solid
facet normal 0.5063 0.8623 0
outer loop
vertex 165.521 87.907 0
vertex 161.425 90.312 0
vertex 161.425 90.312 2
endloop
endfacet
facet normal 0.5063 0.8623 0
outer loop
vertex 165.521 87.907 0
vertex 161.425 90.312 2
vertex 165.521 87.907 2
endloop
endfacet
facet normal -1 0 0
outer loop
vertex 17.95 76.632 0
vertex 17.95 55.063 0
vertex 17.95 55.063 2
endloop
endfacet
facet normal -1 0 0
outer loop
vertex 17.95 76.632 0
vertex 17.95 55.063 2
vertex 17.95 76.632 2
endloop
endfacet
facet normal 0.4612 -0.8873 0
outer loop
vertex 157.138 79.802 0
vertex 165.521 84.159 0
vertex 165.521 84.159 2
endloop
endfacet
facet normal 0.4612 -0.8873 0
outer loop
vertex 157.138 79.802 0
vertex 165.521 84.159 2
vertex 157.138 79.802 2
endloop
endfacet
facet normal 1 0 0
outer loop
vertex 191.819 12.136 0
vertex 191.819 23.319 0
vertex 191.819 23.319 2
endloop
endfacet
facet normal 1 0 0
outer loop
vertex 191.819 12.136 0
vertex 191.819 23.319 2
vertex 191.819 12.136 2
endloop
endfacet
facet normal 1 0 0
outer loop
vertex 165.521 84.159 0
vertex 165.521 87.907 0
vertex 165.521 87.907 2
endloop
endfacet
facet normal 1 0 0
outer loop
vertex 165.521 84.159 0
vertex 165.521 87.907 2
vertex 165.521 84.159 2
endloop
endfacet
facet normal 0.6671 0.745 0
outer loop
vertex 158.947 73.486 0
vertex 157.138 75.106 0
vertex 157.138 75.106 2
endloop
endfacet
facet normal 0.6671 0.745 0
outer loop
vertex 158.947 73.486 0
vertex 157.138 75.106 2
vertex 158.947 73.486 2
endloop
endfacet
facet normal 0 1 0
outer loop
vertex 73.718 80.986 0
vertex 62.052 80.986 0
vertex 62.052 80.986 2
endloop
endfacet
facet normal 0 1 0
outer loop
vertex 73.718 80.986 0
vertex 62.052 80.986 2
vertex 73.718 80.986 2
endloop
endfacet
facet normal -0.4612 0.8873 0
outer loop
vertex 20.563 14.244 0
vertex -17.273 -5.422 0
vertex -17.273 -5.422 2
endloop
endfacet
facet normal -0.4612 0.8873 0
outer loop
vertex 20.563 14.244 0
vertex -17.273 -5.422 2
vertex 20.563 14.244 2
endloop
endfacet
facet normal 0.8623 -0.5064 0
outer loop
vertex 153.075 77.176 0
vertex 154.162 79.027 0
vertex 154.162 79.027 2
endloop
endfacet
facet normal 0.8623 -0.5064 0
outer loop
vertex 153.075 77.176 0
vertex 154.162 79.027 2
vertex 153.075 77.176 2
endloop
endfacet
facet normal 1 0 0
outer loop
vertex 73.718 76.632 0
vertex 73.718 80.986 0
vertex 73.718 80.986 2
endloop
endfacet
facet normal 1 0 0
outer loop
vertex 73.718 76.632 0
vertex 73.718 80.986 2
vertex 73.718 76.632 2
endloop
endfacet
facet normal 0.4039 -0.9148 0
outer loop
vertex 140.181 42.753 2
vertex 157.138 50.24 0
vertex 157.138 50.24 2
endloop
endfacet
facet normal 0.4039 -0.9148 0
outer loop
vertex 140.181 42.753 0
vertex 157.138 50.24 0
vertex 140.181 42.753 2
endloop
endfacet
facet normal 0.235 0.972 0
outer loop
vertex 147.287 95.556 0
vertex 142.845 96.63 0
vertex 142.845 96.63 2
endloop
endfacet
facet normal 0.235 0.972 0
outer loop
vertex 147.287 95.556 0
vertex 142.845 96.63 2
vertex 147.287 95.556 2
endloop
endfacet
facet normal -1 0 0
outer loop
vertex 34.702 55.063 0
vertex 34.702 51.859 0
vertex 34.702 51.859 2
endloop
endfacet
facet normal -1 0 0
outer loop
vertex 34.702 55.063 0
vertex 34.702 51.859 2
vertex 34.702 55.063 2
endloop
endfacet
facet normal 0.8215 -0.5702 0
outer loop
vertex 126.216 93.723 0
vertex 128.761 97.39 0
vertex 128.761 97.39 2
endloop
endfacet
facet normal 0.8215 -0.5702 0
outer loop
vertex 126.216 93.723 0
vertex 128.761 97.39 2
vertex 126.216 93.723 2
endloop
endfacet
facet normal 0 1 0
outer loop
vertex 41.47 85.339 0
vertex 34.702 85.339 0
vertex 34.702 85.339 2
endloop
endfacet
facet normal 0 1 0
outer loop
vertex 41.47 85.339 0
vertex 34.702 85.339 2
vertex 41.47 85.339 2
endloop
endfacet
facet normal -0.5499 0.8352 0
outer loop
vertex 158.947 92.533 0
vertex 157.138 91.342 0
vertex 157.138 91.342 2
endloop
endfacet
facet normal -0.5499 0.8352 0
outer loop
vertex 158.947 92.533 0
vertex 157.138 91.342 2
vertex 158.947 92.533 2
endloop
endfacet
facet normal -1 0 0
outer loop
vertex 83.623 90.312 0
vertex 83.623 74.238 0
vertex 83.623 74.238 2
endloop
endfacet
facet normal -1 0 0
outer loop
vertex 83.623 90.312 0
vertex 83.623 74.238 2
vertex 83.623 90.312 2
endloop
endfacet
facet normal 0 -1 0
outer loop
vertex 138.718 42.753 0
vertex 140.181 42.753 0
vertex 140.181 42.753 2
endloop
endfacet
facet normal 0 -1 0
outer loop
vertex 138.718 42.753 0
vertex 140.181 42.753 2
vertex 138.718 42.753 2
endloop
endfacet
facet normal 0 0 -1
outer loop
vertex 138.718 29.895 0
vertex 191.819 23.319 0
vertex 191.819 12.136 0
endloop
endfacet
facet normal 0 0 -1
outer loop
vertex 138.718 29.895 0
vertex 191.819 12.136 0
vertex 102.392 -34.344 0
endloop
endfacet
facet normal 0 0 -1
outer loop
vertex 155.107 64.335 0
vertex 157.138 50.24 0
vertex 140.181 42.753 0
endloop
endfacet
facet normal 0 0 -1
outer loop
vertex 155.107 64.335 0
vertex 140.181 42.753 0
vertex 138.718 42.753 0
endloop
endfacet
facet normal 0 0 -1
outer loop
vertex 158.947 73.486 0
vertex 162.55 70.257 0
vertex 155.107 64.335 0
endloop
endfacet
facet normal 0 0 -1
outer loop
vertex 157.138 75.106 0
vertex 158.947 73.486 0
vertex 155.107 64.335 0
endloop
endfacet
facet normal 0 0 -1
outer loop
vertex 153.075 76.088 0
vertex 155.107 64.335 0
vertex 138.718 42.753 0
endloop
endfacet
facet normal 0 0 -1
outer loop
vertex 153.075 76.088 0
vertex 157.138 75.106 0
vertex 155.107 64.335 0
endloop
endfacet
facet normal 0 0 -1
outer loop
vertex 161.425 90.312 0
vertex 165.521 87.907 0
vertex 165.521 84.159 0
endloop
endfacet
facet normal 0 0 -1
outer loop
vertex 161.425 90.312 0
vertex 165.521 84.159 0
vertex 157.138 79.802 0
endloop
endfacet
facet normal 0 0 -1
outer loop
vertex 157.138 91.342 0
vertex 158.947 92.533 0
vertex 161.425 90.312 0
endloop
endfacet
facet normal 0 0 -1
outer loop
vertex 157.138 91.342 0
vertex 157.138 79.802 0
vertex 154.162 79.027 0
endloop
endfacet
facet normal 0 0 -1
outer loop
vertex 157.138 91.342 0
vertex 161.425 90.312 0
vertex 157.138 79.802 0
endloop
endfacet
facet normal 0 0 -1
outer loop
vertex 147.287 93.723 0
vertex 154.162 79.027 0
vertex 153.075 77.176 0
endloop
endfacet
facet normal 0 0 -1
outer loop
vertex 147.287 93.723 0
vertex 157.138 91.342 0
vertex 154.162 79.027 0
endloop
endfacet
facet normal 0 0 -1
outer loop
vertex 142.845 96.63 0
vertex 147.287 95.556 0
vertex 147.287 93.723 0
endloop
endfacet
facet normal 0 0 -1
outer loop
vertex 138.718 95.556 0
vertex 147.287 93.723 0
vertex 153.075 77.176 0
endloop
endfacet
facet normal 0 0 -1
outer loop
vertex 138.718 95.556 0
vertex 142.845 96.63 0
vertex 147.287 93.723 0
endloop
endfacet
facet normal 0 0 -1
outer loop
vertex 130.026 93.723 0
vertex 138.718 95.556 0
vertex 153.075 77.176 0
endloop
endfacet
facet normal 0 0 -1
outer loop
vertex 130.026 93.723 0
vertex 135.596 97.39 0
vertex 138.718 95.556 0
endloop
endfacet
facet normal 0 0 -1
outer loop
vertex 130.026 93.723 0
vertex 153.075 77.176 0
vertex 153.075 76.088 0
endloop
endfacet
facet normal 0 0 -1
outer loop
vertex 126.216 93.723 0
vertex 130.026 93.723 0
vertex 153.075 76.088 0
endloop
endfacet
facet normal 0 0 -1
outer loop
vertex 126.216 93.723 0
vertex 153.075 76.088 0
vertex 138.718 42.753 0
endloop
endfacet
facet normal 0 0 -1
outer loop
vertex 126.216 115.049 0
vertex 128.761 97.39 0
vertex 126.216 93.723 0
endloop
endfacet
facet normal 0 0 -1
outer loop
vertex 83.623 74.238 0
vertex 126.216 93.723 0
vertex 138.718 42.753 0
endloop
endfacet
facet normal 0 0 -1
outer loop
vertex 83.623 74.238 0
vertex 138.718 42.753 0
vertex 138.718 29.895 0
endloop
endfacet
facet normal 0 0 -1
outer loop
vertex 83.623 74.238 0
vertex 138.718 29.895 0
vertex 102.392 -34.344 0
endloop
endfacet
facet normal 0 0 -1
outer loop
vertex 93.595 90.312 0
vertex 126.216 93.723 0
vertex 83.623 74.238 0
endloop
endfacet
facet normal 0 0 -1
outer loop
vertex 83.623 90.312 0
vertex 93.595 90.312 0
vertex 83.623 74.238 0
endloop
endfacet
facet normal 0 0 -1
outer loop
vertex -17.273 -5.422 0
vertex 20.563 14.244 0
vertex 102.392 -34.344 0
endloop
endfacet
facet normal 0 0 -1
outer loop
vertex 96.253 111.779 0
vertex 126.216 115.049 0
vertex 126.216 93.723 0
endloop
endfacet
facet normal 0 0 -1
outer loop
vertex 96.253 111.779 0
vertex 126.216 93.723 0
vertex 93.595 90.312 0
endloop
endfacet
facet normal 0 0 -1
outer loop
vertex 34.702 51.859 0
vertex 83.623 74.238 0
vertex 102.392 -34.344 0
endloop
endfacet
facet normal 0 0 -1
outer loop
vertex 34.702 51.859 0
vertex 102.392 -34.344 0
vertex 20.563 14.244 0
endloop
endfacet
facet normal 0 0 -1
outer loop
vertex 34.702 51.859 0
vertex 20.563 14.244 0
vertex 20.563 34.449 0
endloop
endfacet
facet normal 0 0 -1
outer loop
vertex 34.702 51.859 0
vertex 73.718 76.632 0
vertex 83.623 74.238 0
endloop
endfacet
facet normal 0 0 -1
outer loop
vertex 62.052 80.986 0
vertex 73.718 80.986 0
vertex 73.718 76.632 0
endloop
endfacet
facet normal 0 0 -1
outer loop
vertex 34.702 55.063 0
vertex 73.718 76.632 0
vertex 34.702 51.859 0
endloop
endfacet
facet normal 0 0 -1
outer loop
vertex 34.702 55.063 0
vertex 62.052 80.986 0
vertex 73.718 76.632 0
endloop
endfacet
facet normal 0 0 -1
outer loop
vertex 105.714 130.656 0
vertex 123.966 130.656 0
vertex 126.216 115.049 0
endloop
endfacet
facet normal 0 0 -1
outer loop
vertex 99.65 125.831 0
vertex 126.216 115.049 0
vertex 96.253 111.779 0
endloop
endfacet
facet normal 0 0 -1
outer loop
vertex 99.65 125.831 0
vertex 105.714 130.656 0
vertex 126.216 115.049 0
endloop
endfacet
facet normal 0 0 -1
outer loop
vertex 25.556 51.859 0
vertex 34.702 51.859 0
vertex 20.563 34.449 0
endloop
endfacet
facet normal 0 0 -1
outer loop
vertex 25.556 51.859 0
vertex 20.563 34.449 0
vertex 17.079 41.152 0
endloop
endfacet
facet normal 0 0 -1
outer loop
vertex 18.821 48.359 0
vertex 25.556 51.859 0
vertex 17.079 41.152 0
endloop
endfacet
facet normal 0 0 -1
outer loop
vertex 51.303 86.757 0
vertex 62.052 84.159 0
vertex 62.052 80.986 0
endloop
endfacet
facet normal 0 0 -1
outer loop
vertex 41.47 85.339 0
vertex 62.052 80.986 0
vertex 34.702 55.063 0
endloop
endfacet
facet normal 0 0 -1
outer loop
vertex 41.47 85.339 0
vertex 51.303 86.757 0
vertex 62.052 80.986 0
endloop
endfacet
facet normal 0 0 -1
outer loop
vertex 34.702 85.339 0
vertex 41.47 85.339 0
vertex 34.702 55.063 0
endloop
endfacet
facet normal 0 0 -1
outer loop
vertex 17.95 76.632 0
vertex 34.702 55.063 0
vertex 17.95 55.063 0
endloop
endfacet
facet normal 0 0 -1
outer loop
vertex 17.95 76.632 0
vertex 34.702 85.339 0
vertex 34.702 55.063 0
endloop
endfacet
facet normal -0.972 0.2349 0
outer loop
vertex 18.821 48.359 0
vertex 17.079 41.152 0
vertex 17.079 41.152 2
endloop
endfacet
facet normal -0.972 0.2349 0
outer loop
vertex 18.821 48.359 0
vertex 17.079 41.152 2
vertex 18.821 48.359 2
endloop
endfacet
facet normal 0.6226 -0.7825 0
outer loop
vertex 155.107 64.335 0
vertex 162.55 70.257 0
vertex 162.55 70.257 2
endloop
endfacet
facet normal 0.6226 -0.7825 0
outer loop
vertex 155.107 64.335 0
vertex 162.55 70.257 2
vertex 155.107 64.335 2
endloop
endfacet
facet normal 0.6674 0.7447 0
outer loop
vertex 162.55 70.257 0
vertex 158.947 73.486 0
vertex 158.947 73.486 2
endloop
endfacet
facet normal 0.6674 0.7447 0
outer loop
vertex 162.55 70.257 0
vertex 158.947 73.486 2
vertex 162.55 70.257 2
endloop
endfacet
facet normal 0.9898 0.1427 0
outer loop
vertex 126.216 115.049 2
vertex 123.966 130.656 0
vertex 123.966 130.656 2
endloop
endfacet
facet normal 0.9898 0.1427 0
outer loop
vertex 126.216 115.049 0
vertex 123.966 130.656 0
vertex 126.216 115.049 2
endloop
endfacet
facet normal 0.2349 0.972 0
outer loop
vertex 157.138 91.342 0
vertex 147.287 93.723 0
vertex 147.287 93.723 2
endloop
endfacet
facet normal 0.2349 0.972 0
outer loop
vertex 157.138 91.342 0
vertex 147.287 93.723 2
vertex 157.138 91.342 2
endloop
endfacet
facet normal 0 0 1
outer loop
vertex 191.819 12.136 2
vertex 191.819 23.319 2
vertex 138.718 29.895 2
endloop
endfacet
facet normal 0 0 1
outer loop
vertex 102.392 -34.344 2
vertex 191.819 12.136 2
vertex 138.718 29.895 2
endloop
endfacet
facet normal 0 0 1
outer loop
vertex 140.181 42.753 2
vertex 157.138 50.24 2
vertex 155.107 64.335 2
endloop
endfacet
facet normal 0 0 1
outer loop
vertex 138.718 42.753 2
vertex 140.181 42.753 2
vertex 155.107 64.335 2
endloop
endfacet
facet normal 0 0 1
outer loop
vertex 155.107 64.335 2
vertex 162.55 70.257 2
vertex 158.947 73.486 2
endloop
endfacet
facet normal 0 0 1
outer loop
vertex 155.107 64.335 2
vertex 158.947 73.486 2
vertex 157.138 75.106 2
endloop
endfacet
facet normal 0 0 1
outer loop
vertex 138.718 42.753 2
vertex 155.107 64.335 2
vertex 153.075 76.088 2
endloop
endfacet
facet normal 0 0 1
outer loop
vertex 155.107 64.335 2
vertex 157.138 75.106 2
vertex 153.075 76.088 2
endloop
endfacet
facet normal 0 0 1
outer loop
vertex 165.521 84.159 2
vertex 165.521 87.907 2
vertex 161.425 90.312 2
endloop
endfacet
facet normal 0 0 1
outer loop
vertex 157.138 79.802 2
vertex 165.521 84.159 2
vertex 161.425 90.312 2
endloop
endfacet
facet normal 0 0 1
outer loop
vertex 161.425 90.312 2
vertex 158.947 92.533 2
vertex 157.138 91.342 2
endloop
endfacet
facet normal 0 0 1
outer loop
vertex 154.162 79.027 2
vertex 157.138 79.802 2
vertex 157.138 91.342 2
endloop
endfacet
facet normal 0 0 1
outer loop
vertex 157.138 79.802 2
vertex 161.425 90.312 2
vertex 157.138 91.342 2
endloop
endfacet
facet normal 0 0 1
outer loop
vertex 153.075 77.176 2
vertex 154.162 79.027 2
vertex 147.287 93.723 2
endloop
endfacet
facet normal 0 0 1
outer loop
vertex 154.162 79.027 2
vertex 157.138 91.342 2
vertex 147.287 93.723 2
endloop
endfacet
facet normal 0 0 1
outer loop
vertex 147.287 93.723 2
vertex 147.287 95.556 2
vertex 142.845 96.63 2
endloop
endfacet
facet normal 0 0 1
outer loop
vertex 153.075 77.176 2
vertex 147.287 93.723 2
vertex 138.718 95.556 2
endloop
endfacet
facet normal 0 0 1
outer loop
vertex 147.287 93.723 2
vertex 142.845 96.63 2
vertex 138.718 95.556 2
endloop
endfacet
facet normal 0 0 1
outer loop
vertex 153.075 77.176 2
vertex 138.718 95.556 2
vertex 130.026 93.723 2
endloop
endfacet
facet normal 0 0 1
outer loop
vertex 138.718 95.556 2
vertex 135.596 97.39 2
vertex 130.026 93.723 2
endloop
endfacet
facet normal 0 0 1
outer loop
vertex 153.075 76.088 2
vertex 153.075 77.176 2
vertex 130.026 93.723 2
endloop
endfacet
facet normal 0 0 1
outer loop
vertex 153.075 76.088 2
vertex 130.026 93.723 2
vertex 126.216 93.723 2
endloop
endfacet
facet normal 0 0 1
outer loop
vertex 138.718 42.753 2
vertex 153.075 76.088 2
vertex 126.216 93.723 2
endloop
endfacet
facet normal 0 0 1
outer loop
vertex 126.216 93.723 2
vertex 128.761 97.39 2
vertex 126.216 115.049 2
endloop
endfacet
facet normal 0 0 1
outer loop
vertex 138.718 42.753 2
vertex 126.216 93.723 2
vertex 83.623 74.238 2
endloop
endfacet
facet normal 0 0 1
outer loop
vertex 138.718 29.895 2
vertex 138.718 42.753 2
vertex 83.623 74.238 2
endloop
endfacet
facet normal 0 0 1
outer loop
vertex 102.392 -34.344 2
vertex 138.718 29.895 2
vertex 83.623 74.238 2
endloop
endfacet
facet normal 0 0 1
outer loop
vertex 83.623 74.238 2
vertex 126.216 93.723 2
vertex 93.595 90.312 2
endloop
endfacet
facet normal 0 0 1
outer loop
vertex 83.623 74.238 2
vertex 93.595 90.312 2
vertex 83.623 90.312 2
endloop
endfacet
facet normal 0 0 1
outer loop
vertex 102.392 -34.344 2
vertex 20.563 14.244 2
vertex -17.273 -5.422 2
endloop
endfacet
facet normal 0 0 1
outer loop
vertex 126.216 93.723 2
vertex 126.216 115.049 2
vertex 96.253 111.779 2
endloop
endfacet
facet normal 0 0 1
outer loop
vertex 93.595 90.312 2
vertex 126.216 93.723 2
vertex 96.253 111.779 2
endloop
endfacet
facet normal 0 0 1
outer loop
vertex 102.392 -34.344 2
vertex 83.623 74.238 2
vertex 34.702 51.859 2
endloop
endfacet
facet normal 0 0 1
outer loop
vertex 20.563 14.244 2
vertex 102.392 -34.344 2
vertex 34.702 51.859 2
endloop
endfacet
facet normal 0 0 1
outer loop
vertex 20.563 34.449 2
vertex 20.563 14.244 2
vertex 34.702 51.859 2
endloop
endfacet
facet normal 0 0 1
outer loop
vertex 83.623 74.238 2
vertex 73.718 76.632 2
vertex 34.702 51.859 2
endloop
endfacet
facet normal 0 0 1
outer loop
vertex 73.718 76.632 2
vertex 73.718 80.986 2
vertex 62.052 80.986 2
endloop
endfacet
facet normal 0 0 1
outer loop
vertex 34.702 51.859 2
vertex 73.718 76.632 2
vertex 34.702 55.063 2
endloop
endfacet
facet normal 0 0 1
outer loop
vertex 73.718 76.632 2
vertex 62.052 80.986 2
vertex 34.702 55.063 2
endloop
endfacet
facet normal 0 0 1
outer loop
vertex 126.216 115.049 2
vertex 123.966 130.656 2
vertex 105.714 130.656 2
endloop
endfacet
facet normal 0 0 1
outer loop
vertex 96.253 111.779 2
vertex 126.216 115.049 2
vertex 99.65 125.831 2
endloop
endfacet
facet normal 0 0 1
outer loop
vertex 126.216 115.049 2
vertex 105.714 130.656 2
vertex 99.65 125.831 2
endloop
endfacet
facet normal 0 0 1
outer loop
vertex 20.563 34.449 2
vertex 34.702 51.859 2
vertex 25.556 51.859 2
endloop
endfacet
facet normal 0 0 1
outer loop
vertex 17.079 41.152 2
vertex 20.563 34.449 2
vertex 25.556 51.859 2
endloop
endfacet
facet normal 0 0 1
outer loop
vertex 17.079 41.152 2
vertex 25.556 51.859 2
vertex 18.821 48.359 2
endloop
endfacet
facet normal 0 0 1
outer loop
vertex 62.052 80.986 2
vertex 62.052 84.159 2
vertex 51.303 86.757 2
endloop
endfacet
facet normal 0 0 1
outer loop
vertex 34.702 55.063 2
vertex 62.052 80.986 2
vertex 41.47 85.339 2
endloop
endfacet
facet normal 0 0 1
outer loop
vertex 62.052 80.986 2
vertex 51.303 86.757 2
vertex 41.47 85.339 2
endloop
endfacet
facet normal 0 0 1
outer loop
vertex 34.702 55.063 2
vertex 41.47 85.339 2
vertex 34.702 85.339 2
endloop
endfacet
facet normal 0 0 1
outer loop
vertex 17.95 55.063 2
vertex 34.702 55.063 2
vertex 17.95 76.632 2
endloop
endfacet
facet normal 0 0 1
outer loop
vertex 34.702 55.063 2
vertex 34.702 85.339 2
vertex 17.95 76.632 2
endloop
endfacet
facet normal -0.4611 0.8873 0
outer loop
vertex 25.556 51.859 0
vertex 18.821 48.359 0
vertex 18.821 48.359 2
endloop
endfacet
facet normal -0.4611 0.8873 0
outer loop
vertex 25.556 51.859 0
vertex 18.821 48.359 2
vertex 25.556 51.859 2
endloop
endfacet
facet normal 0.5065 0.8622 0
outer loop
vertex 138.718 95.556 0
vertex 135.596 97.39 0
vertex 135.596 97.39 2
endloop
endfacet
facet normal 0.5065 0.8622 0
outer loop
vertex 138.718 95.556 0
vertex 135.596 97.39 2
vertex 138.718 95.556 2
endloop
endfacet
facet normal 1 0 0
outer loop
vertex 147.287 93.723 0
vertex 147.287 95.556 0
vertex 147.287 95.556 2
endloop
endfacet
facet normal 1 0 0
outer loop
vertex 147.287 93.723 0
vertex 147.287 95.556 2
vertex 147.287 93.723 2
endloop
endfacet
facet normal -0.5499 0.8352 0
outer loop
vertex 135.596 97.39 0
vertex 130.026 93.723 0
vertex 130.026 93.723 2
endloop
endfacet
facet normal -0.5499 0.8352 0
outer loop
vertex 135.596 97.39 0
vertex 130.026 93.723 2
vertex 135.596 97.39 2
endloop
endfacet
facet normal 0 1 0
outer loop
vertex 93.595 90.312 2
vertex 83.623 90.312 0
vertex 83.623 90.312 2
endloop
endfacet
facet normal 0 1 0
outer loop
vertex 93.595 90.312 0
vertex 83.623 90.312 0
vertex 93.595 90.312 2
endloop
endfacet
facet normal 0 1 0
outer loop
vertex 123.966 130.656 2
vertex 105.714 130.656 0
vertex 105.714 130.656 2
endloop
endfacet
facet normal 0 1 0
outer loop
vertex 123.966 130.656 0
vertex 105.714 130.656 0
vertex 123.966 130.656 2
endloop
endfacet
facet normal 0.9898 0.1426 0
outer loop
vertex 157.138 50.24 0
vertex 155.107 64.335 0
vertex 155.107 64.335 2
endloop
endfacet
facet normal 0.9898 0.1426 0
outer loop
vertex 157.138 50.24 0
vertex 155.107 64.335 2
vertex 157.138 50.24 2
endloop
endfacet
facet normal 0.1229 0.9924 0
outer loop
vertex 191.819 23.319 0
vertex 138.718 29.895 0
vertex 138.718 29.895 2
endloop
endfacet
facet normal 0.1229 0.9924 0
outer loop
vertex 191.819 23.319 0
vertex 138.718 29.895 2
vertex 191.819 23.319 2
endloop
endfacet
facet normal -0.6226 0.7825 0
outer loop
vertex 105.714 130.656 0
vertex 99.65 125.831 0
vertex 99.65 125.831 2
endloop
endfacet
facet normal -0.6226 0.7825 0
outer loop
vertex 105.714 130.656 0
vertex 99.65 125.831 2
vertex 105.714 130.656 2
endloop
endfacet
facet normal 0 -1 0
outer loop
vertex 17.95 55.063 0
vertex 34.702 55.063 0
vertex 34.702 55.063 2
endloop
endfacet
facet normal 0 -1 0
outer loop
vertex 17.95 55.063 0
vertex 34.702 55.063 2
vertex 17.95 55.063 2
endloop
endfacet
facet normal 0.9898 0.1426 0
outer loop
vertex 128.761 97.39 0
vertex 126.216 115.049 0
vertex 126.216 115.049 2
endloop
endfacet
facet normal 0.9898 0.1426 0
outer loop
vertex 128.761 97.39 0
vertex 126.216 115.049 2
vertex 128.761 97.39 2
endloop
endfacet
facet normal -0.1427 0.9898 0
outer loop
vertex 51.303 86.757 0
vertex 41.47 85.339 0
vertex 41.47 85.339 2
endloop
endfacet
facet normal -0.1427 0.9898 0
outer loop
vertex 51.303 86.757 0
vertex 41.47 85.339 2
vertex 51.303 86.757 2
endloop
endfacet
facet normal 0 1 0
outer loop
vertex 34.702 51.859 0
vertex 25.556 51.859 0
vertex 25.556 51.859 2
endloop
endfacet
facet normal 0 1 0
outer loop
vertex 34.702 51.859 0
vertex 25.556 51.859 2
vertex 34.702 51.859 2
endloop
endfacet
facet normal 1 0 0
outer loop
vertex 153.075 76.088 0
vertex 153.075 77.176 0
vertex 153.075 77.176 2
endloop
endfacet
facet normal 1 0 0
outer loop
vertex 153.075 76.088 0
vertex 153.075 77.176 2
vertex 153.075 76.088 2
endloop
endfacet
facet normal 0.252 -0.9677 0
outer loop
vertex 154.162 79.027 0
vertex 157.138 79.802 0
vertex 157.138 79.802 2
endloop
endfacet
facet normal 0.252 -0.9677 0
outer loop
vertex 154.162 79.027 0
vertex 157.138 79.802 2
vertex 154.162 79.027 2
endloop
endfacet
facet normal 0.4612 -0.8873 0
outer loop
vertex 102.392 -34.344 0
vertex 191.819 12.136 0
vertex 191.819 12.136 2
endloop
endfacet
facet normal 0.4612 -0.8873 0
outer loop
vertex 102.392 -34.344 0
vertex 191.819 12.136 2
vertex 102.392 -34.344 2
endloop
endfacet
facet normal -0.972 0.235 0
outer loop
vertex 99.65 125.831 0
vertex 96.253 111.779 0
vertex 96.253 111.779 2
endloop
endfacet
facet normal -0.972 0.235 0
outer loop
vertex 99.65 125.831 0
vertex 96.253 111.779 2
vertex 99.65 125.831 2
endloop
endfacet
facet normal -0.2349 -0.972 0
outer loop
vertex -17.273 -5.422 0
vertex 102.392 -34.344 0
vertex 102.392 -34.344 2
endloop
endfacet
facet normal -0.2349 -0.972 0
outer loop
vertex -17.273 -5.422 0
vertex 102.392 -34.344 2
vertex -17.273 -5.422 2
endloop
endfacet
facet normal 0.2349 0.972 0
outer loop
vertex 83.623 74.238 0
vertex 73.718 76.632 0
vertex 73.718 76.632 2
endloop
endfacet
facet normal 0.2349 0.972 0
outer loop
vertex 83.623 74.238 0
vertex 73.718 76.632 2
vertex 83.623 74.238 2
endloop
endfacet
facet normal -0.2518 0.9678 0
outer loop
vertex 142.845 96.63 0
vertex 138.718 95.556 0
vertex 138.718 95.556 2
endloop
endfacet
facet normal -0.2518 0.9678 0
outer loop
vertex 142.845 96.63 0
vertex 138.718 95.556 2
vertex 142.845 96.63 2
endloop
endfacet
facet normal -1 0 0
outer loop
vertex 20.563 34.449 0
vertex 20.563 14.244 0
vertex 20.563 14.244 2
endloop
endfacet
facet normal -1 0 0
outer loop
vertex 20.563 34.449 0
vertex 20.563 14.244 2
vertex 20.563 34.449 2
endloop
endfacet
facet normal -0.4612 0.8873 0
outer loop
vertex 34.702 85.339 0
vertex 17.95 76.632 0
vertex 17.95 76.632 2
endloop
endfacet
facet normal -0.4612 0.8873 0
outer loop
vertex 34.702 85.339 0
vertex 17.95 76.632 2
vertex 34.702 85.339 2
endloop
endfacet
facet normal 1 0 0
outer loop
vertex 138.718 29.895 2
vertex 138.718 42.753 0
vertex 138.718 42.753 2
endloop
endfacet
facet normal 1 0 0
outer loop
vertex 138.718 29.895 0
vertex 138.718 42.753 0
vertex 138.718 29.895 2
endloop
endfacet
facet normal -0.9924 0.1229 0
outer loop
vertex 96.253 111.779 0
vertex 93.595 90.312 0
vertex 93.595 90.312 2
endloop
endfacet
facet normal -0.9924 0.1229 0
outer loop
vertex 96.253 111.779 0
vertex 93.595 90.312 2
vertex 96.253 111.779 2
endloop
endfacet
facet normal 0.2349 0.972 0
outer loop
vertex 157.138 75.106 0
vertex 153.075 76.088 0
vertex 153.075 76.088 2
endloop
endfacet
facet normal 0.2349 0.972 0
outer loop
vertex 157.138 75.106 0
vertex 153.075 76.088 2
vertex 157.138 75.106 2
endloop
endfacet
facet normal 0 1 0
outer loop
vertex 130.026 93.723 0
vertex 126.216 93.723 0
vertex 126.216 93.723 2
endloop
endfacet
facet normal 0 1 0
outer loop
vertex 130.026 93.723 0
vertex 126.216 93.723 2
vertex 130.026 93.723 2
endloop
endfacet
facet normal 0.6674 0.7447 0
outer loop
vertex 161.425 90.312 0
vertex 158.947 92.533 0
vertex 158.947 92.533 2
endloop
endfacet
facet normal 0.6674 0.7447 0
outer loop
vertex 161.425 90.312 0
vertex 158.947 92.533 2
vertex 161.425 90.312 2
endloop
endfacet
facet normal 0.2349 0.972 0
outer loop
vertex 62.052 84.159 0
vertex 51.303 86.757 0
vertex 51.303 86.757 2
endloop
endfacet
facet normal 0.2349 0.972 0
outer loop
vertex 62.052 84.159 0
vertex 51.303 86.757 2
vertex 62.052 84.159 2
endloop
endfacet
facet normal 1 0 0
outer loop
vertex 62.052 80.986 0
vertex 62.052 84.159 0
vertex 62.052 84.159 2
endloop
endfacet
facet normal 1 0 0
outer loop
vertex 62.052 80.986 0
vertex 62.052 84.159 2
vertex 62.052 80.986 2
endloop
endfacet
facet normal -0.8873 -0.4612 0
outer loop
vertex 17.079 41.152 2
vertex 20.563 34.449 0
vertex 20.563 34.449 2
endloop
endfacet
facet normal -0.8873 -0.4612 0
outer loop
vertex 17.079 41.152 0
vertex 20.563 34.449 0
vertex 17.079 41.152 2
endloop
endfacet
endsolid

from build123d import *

# Parameters (mm, degrees)
AUFSATZ_LINEAR_AUSTRAGEN1_DEPTH = 2


with BuildPart() as part:
    # Skizze1 → Aufsatz-Linear austragen1 (new body)
    with BuildSketch(Plane.XY):
        Polygon((126.215995869, 93.72314004), (130.025876451, 93.72314004), (135.595633387, 97.38954443), (138.718293672, 95.556342235), (142.844671433, 96.629977996), (147.286818563, 95.556342235), (147.286818563, 93.72314004), (157.138174255, 91.342136563), (158.946705069, 92.532638301), (161.425092467, 90.311861568), (165.521072329, 87.907258253), (165.521072329, 84.158745075), (157.138174255, 79.801706236), (154.161759315, 79.027277499), (153.074965654, 77.17604286), (153.074965654, 76.08832996), (157.138174255, 75.10628098), (158.946705069, 73.485734023), (162.549971035, 70.257001813), (155.106569955, 64.335109931), (157.138174255, 50.240352889), (140.181002279, 42.752564778), (138.718293672, 42.752564778), (138.718293672, 29.895134459), (191.818980244, 23.319015351), (191.818980244, 12.135974598), (102.392093357, -34.343943925), (-17.273133713, -5.421699037), (20.56292279, 14.243715747), (20.56292279, 34.449415172), (17.079292064, 41.151884986), (18.821107427, 48.358612255), (25.556462177, 51.859335035), (34.70239759, 51.859335035), (34.70239759, 55.062538542), (17.950199746, 55.062538542), (17.950199746, 76.63218641), (34.70239759, 85.339196326), (41.469675345, 85.339196326), (51.303413636, 86.75662161), (62.052077393, 84.158745075), (62.052077393, 80.985691368), (73.7183454, 80.985691368), (73.7183454, 76.63218641), (83.622998605, 74.238301298), (83.622998605, 90.311861568), (93.594862899, 90.311861568), (96.253356842, 111.778603776), (99.649825979, 125.83142893), (105.714042553, 130.656056075), (123.966404927, 130.656056075), (126.215995869, 115.048962824), (128.761406921, 97.38954443), align=None)
    extrude(amount=AUFSATZ_LINEAR_AUSTRAGEN1_DEPTH)


solid = part.part
